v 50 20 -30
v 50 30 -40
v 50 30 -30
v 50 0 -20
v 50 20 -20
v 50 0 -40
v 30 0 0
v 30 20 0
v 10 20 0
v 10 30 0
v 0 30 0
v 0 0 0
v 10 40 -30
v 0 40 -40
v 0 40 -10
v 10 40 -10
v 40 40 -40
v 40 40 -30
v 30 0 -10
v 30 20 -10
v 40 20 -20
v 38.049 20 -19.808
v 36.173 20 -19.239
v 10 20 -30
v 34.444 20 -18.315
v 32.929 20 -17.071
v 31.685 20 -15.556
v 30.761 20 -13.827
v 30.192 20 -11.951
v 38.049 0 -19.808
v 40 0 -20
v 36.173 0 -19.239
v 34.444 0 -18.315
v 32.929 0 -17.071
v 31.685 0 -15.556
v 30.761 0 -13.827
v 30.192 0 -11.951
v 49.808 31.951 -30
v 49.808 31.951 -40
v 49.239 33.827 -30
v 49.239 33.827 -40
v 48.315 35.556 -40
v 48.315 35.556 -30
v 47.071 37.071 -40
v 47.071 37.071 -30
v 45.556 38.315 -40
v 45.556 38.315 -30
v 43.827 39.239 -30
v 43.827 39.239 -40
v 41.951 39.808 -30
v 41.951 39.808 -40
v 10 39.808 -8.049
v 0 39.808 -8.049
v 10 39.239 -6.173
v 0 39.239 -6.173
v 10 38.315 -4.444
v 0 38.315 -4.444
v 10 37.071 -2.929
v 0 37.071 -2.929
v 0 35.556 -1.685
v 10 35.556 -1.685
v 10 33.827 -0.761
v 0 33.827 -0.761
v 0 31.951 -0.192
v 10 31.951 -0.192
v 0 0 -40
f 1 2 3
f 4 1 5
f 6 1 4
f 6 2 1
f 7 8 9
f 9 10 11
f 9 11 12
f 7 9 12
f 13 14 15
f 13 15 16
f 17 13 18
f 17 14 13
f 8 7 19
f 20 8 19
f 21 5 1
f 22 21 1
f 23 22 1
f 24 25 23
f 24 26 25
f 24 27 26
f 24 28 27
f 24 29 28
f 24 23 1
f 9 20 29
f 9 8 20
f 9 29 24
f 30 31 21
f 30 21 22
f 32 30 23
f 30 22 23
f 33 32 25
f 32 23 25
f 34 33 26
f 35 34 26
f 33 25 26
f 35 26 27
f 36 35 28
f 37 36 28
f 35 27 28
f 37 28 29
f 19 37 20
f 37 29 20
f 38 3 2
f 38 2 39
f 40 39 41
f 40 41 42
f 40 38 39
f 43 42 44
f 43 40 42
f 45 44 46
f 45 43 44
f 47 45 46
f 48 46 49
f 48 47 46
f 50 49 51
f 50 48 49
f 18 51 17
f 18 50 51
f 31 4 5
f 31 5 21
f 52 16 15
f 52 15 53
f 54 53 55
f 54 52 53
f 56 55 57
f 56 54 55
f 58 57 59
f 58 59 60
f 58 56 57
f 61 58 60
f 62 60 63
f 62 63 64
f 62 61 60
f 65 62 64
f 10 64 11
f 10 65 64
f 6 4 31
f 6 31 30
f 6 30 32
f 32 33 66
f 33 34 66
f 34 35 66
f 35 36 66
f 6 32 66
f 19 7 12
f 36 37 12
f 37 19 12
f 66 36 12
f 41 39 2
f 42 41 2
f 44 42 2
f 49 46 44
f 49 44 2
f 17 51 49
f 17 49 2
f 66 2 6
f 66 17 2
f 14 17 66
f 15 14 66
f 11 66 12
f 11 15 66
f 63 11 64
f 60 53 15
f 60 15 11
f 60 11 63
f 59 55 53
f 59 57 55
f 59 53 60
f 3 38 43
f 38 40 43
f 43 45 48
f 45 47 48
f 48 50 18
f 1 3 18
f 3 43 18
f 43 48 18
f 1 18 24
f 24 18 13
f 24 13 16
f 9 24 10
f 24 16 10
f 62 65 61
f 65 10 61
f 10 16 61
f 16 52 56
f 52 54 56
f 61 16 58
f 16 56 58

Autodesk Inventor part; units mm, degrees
ref_plane "YZ Plane" through (0, 0, 0) normal (1, 0, 0) x (0, 1, 0)
ref_plane "XZ Plane" through (0, 0, 0) normal (0, 1, 0) x (-1, 0, 0)
ref_plane "XY Plane" through (0, 0, 0) normal (0, 0, 1) x (1, 0, 0)
sketch "草圖1" plane through (0, 0, 0) normal (0, 1, 0) x (-1, 0, 0)
  line L0 (0, 0) -> (-30, 0)
  line L1 (-30, 0) -> (-30, -40)
  line L2 (-30, -40) -> (0, -40)
  line L3 (0, -40) -> (0, 0)
  line L4 (-30, -40) -> (-50, -40)
  line L5 (-50, -40) -> (-50, -20)
  line L6 (-50, -20) -> (-30, -20)
  line L7 (-30, -20) -> (-30, -40)
  dimension "d0" = 40
  dimension "d1" = 20
  dimension "d2" = 20
  dimension "d3" = 30
extrude "擠出1" add sketch "草圖1" along normal blind 20
sketch "草圖2" plane through (0, 0, -40) normal (-1, 0, 0) x (0, 0, 1)
  line L0 (40, 0) -> (40, 20) projected
  line L1 (40, 20) -> (0, 20)
  line L2 (0, 20) -> (0, 40)
  line L3 (0, 40) -> (40, 40)
  line L4 (40, 40) -> (40, 20)
  dimension "d6" = 20
extrude "擠出2" add sketch "草圖2" against normal blind 10
sketch "草圖3" plane through (50, 0, -40) normal (0, 0, -1) x (-1, 0, 0)
  line L0 (0, 20) -> (40, 20) projected
  line L1 (50, 40) -> (40, 40) projected
  line L2 (0, 20) -> (40, 20)
  line L3 (40, 20) -> (40, 40)
  line L4 (40, 40) -> (0, 40)
  line L5 (0, 40) -> (0, 20)
  point P0 (50, 0)
extrude "擠出3" add sketch "草圖3" against normal blind 10
fillet "圓角1" radius 10 3 edges at (50, 40, -35) (5, 40, 0) (30, 10, -20)
properties part number "36"
